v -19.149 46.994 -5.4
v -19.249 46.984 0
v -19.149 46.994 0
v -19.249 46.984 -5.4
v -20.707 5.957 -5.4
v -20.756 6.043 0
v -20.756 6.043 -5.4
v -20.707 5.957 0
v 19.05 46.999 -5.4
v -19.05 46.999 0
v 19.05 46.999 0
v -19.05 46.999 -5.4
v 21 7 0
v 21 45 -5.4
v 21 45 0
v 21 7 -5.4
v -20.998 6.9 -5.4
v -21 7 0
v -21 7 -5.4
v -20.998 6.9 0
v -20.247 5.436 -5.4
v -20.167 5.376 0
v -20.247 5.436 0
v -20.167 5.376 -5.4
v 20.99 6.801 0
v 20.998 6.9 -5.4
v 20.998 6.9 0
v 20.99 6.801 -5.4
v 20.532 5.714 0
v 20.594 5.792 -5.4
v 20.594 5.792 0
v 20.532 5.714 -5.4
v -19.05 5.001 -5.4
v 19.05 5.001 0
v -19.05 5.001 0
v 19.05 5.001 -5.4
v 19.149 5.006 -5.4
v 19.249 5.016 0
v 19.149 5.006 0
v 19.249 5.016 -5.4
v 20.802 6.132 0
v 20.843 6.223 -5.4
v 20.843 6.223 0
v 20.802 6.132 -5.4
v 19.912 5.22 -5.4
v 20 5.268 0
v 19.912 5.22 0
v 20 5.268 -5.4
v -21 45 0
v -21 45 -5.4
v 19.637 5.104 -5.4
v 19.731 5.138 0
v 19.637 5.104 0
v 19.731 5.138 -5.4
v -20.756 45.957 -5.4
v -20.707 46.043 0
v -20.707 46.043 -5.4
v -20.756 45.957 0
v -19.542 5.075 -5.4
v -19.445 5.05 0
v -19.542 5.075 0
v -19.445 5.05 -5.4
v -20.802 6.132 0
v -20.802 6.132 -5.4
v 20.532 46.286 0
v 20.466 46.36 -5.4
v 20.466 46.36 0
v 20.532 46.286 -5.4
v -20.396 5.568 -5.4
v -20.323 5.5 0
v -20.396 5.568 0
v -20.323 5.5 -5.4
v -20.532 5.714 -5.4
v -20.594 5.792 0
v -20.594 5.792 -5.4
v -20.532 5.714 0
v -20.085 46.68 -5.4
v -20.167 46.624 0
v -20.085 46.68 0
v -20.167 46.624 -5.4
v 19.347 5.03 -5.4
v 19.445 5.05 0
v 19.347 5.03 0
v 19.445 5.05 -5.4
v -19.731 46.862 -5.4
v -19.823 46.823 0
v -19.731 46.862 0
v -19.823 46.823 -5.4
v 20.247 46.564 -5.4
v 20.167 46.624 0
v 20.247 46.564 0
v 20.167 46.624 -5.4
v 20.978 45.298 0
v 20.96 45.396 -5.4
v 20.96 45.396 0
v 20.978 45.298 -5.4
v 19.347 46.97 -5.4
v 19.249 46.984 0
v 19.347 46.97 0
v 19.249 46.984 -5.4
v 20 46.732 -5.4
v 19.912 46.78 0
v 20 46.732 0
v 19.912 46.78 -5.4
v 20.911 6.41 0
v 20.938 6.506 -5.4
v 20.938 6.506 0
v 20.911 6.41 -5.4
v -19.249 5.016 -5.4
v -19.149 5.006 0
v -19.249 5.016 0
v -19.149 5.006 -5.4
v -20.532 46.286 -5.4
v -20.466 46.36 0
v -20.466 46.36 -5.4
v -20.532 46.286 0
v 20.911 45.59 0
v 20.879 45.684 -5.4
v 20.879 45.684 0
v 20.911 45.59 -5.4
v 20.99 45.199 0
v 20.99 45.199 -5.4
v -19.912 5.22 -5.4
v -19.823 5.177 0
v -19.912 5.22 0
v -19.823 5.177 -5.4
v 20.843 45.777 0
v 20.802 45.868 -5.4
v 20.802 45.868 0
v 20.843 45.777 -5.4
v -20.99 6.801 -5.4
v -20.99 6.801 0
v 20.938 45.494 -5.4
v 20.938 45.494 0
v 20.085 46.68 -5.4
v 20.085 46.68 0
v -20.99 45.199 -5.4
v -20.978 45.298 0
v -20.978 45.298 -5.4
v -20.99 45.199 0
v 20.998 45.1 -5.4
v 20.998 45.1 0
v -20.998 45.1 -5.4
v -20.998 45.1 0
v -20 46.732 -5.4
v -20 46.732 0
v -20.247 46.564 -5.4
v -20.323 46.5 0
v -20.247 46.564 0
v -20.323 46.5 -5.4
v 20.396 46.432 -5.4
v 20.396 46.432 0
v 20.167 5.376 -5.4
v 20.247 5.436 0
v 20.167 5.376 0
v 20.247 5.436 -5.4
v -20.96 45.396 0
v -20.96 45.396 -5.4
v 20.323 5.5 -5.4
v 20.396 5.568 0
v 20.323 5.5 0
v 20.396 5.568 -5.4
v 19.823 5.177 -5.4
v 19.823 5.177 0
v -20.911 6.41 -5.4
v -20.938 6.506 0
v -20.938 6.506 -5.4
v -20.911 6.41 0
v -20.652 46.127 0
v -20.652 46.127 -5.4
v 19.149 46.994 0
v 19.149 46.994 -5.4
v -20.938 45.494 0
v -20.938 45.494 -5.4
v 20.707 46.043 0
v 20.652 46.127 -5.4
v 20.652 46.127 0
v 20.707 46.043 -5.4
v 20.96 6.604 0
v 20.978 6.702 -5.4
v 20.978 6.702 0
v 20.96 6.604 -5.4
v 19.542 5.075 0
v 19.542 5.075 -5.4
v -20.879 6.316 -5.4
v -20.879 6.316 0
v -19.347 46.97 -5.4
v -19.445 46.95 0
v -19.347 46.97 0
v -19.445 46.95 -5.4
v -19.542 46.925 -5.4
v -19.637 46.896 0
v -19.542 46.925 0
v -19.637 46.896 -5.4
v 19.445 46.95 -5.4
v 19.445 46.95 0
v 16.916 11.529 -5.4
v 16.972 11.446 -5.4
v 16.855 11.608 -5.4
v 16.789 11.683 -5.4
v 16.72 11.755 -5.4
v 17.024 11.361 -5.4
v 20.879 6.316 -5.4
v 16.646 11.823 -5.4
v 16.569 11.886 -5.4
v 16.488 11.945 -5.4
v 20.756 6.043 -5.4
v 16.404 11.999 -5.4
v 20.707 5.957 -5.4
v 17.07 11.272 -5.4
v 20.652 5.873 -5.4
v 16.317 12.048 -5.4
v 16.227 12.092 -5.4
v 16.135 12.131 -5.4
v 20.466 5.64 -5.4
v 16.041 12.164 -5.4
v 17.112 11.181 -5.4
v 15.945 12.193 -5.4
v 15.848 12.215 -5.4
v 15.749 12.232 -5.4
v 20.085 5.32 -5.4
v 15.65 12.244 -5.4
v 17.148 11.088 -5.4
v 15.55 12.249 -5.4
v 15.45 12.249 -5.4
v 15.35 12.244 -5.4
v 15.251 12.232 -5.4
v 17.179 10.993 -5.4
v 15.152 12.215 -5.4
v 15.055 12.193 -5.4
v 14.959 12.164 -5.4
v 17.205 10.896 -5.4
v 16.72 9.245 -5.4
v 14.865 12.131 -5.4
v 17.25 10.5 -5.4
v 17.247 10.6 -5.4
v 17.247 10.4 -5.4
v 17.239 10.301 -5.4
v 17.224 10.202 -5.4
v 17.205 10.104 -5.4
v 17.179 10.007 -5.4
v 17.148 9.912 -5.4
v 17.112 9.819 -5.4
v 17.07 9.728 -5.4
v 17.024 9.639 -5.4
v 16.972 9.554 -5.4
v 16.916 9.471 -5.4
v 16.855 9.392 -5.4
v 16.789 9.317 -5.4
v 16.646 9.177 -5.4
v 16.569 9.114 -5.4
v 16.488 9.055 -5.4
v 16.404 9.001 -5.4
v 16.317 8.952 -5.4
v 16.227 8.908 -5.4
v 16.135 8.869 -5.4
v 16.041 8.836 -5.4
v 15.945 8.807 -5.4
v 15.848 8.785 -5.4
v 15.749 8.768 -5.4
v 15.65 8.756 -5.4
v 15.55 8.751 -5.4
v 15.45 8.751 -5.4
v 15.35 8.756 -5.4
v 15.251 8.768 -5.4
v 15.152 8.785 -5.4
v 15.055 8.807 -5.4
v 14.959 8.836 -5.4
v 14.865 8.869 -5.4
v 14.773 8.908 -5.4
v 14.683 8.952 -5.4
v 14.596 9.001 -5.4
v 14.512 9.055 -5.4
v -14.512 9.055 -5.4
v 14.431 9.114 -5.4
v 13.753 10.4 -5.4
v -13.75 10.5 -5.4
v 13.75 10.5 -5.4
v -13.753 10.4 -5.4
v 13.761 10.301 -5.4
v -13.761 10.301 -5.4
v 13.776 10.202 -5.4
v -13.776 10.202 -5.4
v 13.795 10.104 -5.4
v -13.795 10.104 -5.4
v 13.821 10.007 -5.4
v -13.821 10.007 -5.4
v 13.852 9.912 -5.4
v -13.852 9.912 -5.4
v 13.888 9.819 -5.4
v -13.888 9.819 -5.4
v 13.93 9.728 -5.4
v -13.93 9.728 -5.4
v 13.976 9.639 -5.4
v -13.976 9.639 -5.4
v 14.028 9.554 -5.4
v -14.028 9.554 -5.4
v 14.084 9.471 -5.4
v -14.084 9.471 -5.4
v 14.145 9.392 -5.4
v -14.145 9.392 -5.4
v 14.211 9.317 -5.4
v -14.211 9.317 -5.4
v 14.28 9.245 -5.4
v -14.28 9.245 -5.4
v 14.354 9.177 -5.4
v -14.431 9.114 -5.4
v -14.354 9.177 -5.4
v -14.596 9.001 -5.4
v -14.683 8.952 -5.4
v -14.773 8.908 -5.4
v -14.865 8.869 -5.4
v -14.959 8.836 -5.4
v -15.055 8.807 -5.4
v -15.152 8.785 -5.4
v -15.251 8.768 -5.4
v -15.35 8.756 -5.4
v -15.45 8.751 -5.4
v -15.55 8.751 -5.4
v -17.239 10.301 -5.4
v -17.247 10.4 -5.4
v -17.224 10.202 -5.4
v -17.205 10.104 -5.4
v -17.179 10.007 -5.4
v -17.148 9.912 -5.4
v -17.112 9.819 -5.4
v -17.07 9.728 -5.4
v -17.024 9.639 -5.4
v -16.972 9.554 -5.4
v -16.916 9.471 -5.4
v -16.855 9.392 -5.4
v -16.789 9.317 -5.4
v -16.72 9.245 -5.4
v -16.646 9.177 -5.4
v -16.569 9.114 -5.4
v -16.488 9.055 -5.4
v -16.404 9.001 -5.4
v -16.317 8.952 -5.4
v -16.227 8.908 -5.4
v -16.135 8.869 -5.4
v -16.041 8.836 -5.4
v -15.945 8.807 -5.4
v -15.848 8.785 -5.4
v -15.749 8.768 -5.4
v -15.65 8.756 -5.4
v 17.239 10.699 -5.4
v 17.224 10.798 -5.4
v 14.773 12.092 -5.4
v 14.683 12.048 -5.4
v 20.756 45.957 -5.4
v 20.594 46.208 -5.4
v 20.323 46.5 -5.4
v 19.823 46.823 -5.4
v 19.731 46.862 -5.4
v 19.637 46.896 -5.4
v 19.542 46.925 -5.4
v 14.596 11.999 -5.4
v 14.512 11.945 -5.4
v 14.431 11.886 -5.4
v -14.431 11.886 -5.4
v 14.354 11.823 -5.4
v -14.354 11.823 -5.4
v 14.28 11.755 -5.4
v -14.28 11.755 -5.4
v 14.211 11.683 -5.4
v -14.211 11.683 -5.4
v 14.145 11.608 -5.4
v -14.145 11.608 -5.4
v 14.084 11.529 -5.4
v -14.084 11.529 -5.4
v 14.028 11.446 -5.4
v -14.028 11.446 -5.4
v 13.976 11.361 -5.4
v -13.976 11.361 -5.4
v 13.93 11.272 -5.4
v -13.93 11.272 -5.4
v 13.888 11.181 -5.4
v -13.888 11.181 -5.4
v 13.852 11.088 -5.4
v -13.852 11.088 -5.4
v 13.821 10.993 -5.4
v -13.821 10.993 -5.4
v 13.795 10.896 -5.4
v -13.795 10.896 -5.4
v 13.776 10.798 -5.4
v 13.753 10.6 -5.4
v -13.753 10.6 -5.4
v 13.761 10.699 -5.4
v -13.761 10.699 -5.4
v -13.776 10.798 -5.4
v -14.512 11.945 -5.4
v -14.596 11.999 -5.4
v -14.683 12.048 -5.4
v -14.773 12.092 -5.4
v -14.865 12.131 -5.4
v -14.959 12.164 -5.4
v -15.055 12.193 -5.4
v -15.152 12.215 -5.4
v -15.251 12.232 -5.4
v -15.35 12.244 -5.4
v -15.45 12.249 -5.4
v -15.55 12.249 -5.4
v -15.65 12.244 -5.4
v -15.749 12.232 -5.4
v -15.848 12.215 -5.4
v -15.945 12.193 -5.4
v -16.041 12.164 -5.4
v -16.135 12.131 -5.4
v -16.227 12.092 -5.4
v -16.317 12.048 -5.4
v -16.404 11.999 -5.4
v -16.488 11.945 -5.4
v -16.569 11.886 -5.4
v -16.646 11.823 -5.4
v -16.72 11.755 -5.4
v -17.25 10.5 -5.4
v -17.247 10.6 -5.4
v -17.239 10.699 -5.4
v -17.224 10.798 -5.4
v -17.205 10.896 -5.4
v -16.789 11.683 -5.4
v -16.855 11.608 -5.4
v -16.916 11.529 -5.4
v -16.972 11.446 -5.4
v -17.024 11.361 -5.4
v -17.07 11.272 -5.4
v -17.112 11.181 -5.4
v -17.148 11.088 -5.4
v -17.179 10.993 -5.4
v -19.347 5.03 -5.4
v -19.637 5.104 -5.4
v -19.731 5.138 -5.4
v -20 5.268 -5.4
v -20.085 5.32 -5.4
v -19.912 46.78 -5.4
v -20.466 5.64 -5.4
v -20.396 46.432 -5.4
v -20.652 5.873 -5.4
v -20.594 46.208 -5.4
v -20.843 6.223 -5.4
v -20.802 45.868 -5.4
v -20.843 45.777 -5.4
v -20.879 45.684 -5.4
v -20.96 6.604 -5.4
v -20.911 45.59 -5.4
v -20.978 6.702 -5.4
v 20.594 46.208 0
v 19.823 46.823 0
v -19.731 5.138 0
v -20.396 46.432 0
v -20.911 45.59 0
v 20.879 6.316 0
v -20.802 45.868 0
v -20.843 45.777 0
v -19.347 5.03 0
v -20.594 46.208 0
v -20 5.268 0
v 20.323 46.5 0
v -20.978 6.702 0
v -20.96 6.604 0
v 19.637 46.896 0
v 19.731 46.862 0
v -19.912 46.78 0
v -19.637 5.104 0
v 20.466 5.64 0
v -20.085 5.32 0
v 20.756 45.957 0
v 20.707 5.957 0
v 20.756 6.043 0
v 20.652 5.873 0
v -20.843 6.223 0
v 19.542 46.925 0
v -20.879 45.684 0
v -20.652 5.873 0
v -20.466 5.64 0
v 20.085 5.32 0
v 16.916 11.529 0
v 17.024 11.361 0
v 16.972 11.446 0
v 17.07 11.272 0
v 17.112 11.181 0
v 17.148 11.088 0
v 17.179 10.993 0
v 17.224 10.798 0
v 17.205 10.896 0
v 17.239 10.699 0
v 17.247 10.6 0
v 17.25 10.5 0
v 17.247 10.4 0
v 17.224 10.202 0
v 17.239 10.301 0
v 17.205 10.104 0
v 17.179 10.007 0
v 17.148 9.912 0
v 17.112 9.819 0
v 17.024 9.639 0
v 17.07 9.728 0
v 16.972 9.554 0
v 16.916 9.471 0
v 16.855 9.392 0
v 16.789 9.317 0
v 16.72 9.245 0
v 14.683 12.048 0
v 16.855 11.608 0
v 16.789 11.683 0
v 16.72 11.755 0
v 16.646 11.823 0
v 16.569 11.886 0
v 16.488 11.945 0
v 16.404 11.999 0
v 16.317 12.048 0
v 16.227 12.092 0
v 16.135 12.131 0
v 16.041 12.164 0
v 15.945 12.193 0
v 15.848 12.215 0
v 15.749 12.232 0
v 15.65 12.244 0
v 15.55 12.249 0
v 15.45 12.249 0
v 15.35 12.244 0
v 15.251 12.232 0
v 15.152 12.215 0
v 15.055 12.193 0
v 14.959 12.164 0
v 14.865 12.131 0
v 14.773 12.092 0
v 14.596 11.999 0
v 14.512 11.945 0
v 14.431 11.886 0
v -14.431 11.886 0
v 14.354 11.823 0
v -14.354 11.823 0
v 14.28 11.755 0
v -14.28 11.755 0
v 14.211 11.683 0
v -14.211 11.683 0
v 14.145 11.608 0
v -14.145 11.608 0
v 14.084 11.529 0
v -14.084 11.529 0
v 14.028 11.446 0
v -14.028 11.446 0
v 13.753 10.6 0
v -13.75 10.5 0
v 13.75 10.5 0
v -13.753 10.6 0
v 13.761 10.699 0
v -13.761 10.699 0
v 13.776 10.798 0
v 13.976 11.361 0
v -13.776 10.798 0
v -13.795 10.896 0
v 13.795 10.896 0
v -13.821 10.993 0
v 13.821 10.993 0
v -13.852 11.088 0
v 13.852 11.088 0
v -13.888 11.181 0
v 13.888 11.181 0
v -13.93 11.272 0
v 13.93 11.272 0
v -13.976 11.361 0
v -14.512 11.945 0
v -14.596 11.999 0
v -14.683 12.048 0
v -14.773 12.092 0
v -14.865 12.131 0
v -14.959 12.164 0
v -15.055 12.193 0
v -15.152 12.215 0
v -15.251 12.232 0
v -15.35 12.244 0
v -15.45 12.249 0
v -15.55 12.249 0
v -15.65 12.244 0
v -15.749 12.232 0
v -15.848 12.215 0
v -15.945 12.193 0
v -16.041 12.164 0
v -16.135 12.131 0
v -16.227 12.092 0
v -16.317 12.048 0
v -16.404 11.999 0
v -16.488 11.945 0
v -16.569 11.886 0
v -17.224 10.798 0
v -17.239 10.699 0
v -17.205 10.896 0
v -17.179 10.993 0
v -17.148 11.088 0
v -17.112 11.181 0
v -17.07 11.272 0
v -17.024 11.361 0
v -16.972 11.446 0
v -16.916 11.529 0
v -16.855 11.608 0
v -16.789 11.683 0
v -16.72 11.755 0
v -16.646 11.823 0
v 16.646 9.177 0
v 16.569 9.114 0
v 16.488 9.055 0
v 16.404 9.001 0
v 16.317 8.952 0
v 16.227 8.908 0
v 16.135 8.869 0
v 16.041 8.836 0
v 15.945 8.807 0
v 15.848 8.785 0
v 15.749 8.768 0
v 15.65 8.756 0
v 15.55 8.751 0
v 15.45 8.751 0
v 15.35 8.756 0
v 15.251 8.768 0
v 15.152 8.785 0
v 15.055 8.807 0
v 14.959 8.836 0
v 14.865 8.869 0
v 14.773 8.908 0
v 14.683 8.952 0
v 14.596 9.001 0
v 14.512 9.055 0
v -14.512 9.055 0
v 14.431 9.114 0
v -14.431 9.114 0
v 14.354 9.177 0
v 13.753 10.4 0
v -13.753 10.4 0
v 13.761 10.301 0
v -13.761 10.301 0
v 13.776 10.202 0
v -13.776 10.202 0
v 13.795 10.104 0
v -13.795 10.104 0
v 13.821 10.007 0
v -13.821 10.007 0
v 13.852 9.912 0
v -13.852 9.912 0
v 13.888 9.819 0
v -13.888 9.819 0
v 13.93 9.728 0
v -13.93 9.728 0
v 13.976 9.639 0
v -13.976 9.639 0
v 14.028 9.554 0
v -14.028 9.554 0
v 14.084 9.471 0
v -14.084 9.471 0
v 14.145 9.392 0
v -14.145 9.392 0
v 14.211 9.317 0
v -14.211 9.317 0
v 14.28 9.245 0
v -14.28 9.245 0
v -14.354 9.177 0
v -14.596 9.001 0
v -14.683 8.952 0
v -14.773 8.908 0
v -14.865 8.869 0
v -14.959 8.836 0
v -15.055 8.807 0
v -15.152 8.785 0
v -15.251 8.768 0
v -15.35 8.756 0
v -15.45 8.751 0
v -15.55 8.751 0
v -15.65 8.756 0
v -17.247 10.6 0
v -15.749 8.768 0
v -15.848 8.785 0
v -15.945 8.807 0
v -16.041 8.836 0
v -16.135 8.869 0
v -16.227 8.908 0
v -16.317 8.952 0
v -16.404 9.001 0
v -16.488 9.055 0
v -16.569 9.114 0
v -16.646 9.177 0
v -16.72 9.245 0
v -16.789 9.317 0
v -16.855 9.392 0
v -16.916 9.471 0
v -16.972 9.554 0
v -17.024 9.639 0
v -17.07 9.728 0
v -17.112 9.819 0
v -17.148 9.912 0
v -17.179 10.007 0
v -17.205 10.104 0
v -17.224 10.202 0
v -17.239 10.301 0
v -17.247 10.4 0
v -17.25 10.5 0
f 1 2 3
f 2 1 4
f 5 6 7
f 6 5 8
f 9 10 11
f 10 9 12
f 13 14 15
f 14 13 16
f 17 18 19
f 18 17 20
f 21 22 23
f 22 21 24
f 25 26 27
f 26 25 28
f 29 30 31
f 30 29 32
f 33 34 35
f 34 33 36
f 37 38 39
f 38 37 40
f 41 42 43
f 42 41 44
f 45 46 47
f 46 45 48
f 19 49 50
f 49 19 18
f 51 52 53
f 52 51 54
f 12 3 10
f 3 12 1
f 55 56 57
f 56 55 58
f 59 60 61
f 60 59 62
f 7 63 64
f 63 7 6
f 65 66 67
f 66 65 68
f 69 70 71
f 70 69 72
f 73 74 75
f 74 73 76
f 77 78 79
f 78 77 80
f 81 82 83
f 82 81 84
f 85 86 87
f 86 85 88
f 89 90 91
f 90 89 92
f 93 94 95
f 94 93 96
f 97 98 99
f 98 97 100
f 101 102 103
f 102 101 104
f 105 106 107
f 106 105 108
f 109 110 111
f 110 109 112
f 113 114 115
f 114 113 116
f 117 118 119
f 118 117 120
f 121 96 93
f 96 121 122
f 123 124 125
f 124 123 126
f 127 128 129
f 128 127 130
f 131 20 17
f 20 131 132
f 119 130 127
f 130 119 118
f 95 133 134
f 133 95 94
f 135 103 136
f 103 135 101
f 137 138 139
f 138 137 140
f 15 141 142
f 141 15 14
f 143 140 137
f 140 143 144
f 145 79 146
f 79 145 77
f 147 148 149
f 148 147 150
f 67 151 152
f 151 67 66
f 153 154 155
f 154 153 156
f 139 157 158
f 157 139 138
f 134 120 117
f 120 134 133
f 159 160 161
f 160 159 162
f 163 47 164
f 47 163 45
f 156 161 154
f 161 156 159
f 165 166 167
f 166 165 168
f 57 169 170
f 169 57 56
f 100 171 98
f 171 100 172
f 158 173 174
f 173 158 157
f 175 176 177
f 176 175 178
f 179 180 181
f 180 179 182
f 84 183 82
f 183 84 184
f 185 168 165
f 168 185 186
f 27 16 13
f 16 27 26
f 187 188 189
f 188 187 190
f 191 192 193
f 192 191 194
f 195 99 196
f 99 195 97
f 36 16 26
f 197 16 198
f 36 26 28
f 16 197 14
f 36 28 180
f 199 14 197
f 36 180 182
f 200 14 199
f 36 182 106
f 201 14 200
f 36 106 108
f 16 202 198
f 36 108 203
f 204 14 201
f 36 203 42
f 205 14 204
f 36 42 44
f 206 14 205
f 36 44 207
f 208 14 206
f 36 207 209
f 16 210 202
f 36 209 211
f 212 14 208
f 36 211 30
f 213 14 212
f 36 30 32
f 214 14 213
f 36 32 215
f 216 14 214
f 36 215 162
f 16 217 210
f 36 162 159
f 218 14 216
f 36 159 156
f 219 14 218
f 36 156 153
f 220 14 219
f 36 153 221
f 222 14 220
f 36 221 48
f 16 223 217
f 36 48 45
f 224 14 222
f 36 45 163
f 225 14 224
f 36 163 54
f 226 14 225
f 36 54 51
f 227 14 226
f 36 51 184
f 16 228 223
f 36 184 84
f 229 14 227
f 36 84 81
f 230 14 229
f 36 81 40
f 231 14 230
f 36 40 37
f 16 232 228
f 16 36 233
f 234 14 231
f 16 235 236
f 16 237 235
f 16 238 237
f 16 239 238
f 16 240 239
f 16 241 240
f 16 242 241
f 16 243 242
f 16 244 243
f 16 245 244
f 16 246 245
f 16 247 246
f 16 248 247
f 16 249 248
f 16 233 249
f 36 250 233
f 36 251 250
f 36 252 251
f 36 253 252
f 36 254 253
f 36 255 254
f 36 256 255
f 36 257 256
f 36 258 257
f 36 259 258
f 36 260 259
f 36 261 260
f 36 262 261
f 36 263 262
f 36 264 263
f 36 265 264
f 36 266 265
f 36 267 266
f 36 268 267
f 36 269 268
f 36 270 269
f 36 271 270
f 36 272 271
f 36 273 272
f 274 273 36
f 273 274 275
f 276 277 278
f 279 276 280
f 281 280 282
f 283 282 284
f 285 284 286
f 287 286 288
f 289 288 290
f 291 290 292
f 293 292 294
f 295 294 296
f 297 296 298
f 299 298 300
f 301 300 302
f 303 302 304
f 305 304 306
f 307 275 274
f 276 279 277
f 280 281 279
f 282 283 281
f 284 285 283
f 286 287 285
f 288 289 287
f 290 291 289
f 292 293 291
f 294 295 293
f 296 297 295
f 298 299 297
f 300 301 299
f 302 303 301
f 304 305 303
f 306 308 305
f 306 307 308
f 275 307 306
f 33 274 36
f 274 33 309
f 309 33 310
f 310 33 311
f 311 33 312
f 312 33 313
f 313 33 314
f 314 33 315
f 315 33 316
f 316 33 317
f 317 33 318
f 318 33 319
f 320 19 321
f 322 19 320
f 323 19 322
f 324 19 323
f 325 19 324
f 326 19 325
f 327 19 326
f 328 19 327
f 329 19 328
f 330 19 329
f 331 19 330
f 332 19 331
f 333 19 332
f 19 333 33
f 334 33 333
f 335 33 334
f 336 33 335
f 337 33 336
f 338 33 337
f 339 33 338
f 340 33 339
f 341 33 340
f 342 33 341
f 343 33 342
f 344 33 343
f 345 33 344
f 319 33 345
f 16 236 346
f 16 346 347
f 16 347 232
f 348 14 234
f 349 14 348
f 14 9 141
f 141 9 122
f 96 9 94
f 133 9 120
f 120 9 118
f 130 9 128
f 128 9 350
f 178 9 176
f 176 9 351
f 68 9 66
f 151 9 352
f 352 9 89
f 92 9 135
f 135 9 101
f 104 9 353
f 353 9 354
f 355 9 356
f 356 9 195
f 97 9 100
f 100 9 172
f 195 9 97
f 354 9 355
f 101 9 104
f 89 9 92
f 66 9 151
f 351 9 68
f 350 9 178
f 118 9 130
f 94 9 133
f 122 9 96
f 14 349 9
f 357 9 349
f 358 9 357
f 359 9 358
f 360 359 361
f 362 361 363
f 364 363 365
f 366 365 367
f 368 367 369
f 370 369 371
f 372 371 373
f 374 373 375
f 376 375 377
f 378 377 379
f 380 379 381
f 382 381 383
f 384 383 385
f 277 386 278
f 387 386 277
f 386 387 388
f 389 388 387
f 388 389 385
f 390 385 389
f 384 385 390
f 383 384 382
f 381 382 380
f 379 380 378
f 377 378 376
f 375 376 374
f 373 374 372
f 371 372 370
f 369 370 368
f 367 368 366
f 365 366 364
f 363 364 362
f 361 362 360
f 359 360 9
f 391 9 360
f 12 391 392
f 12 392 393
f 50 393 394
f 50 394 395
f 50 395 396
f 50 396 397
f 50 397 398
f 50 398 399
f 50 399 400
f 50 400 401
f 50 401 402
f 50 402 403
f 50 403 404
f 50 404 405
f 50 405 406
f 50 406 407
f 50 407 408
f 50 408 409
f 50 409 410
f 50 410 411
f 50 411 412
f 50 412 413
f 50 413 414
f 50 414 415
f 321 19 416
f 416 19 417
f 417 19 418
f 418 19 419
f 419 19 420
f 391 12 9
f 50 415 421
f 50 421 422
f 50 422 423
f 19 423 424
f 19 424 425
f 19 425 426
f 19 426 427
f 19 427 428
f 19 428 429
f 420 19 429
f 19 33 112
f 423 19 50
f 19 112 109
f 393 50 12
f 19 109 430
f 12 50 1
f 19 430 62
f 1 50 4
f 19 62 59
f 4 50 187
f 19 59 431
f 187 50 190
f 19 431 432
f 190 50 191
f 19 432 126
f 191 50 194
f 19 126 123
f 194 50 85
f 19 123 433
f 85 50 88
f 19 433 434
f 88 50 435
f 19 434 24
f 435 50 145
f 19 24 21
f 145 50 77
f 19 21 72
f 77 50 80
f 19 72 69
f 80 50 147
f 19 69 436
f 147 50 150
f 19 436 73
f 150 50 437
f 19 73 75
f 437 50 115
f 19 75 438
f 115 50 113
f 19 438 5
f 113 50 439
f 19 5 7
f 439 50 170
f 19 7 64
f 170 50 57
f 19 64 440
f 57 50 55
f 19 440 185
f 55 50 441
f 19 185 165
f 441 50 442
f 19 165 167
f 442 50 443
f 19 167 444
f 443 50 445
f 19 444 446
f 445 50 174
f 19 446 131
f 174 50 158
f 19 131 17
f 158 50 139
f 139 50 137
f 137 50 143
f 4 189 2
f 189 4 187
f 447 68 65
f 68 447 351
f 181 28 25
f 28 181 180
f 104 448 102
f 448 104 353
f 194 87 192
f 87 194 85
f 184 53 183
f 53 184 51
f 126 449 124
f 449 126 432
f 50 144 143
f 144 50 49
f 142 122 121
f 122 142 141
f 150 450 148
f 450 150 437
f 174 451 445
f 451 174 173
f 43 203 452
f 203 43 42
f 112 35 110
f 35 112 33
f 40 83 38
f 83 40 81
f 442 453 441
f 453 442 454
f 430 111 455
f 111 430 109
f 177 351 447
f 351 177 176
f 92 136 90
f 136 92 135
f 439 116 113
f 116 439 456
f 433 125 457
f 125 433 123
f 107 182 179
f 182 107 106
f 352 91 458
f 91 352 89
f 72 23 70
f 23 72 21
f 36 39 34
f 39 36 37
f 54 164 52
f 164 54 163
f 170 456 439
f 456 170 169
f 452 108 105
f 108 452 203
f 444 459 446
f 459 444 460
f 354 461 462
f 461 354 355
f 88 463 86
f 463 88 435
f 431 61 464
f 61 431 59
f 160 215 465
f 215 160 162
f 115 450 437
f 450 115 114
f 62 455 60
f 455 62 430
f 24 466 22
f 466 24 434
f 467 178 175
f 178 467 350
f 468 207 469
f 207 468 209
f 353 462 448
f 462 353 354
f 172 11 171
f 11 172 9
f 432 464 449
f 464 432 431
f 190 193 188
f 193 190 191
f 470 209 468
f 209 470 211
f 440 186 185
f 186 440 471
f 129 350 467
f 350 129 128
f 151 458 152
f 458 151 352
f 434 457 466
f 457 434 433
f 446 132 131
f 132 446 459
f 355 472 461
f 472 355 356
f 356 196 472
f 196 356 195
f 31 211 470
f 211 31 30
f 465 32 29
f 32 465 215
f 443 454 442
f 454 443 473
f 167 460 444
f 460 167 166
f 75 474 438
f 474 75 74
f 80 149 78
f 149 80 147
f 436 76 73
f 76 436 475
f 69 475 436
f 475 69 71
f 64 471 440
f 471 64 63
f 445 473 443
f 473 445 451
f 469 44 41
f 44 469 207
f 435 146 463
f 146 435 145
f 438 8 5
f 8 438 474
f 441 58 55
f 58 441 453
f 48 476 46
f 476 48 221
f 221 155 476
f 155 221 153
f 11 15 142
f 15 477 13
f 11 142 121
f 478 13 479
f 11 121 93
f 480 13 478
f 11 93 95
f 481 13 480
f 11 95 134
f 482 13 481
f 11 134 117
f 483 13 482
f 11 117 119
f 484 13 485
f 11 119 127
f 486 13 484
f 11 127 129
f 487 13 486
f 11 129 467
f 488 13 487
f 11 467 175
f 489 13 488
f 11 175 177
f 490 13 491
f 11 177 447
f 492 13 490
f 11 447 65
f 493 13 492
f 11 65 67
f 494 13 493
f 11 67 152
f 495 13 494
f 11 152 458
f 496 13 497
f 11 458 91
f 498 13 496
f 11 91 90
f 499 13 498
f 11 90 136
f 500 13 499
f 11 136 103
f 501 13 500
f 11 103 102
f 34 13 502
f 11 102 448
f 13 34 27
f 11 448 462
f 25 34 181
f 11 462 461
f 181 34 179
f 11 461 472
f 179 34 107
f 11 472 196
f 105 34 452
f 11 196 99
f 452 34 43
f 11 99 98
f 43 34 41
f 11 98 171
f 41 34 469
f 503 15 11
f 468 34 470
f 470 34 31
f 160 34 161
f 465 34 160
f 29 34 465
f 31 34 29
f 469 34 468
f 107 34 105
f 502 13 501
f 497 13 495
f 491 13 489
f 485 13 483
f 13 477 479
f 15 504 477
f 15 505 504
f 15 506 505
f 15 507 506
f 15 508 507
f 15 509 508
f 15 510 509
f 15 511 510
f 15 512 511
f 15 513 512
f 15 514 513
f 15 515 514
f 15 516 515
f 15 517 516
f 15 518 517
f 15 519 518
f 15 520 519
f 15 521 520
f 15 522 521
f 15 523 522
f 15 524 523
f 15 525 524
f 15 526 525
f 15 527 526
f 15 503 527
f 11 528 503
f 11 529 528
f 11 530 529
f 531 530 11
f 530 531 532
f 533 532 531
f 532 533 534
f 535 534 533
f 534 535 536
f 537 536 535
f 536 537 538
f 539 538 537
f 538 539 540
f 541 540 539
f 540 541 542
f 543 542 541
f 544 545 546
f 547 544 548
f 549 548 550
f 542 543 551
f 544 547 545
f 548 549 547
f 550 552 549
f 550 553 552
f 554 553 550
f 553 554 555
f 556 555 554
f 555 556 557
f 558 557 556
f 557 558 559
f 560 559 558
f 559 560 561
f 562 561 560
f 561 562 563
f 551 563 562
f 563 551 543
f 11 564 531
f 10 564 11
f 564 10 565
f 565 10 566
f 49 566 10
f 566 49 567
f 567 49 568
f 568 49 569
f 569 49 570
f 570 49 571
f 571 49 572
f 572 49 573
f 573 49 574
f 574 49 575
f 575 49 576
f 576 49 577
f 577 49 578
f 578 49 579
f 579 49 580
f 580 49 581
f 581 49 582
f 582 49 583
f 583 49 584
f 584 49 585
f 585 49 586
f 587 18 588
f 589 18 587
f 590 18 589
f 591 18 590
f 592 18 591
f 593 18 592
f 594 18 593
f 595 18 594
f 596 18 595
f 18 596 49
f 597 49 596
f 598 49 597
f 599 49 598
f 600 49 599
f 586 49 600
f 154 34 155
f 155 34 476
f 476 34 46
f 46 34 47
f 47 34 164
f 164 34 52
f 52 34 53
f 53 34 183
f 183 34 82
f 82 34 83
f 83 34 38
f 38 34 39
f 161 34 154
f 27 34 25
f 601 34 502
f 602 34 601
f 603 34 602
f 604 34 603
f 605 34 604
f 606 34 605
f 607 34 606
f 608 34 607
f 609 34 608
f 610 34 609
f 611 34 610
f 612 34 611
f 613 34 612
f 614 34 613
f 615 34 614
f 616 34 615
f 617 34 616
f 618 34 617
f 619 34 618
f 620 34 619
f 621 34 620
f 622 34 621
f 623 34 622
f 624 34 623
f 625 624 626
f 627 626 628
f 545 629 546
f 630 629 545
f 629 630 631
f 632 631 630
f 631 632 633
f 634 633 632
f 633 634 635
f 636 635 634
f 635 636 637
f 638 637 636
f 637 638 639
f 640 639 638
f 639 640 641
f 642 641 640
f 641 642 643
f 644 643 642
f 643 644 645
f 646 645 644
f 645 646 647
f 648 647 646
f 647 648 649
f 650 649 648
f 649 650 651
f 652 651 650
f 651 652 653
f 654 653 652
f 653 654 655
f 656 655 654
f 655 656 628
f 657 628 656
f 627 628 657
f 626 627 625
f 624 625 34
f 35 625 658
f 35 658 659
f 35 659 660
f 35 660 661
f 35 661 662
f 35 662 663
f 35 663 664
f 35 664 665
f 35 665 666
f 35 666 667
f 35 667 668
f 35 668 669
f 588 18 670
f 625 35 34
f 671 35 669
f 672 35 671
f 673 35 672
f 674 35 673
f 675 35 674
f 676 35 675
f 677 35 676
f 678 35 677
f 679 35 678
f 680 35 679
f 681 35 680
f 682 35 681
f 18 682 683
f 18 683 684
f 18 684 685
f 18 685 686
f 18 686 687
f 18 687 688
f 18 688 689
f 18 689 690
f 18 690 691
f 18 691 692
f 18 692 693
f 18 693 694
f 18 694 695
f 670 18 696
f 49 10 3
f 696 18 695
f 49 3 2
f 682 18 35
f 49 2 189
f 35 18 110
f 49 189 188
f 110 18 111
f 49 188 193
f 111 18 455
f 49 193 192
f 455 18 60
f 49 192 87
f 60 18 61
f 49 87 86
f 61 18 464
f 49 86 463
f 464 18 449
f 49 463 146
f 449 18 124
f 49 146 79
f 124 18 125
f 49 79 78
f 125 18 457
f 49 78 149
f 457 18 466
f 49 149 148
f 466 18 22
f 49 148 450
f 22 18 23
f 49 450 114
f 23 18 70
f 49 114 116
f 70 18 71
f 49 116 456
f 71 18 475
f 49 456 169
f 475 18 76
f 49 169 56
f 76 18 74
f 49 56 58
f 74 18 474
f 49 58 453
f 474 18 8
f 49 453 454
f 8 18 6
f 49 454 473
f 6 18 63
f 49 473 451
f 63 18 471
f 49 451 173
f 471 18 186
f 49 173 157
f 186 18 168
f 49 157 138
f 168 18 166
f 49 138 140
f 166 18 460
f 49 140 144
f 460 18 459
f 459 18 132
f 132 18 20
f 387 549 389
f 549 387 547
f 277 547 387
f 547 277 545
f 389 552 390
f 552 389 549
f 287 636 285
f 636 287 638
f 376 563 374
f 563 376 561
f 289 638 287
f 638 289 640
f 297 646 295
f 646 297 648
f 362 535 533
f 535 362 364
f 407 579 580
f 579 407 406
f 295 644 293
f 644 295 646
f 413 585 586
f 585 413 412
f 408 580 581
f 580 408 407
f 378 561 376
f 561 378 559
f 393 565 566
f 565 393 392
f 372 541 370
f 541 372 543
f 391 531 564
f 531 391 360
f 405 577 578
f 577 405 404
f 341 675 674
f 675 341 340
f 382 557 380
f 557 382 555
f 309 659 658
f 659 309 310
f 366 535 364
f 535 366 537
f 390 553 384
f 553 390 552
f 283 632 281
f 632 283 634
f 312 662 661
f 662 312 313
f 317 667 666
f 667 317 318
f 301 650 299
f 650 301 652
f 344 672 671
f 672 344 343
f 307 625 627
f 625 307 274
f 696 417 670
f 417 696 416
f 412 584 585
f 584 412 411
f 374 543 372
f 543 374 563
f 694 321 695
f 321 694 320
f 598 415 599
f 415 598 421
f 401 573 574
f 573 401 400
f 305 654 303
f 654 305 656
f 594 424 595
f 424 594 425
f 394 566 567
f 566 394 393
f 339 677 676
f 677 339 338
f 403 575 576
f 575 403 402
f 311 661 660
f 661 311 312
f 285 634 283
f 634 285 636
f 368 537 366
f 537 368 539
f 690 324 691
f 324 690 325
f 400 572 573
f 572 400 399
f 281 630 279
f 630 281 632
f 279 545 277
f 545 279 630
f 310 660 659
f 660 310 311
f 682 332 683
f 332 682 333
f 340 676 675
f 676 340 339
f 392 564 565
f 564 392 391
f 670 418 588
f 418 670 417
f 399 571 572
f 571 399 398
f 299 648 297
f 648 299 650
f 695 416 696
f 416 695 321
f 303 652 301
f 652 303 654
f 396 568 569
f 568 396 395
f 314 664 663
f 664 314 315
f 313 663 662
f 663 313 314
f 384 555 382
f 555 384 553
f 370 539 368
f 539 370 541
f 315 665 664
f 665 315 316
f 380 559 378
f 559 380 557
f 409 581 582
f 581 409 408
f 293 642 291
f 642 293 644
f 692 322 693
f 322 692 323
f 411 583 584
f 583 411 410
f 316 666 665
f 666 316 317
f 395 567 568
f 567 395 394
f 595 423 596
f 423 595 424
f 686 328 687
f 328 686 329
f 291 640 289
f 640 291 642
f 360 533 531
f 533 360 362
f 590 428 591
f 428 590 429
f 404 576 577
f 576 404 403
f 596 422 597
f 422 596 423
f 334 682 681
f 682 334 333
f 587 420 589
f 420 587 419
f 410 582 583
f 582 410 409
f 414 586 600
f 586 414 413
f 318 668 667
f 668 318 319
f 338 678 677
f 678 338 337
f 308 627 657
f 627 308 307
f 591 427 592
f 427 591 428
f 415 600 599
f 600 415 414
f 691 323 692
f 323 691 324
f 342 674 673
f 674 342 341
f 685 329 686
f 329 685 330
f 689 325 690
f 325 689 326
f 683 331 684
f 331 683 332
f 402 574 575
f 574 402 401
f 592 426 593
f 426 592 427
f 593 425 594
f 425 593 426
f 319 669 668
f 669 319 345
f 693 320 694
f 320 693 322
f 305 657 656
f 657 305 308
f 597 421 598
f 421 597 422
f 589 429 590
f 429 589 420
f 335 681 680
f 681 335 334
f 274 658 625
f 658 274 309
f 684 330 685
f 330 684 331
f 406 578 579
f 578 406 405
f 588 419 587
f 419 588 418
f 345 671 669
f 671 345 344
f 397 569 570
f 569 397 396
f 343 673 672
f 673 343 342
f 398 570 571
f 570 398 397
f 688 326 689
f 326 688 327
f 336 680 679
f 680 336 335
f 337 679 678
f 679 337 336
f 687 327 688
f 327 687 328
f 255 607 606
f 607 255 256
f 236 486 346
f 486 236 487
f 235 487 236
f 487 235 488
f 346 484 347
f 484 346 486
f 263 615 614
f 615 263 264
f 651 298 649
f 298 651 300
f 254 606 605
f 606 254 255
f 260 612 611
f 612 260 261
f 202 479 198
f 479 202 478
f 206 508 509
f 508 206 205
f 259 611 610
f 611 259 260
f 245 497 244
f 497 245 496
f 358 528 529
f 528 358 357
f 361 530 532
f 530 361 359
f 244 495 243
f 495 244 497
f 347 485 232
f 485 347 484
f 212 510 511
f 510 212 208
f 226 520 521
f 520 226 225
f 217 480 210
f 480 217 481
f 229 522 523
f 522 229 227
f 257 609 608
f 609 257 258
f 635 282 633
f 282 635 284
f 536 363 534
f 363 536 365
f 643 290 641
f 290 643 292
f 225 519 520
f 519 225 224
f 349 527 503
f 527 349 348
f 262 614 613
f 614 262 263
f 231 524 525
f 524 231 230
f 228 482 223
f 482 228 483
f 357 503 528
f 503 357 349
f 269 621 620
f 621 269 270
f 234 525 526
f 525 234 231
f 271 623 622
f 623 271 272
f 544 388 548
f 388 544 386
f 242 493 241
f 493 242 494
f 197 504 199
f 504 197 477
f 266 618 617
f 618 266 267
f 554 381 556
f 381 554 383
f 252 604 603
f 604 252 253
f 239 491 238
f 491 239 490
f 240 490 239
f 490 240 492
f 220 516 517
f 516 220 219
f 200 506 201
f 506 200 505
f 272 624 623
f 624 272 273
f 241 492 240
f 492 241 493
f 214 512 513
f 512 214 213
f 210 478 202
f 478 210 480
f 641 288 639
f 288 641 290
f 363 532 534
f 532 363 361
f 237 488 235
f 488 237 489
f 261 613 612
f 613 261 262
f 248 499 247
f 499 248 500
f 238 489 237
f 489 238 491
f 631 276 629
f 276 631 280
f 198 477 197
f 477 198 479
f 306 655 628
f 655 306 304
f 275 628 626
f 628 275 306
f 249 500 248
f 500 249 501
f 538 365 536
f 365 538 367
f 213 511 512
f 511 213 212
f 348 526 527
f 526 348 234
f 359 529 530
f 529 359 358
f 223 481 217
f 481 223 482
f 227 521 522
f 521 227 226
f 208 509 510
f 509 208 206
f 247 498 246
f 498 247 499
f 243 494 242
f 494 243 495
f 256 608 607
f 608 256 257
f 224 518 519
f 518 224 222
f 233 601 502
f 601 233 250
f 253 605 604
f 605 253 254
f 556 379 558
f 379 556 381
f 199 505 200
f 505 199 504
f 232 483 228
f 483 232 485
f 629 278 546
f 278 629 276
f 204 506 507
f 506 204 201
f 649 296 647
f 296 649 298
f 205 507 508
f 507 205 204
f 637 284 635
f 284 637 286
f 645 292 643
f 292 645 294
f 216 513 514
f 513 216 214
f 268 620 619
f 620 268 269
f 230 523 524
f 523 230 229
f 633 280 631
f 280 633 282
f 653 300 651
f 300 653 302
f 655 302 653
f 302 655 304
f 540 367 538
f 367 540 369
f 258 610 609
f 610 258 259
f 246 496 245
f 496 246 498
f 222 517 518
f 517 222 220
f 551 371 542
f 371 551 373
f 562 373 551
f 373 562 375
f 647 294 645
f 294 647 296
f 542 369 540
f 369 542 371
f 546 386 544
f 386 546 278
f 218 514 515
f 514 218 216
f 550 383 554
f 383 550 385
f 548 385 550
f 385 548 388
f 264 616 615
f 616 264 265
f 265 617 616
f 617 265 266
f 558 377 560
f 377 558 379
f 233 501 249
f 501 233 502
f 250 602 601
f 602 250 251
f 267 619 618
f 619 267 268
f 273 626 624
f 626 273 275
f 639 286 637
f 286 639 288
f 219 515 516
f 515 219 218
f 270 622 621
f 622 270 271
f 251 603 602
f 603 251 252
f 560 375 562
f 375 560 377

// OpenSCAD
/* 
Minor modification to this otherwise good carriage mount so that I can mount a Nema motor directly
      to the carriage plate without an adapter

      -- OK, well. There is an adapter now, but it's just because I thought this was better than 
             cutting a bolt to the cirrect length
*/

/* Render quality variables */
$fa = 1;
$fs = 0.1;

distanceBetweenThroughHoles = 31;
yOffset = 10;

supportDepth = 5.4;
supportWidth = 42;
supportHeight = 42;
cornerDiameter = 4;

nemaHoleOffset = 5.5;

spacerPlate();
// xCarriage();

module xCarriage()
{
    difference()
    {
        {
            import( "thirdParty/X-Carriage-mod.stl" );
        }
        {
            translate( [-1 * (distanceBetweenThroughHoles/2), yOffset, -1] )
            {
                m3ThroughHole();

                translate( [0, 0, 5.7] )
                {
                    m3HeadCutout();
                }
            }
            translate( [(distanceBetweenThroughHoles/2), yOffset, -1] )
            {
                m3ThroughHole();
                translate( [0, 0, 5.7] )
                {
                    m3HeadCutout();
                }
            }
        }
    }
}



module spacerPlate()
{
    difference()
    {
        {
            translate( [-1 * (supportWidth/2), 5, -1 * supportDepth] )
            {
                hull()
                {
                    {
                        translate( [(cornerDiameter/2), (cornerDiameter/2), 0] )
                        {
                            cube( [supportWidth - cornerDiameter, supportHeight - cornerDiameter, supportDepth] );
                        }
                    }
                    {
                        union()
                        {
                            translate( [(cornerDiameter/2), (cornerDiameter/2), 0] )
                            {
                                cylinder( d = cornerDiameter, h = supportDepth);
                            }

                            translate( [(cornerDiameter/2), supportHeight - (cornerDiameter/2), 0] )
                            {
                                cylinder( d = cornerDiameter, h = supportDepth);
                            }

                            translate( [supportWidth - (cornerDiameter/2), (cornerDiameter/2), 0] )
                            {
                                cylinder( d = cornerDiameter, h = supportDepth);
                            }

                            translate( [supportWidth - (cornerDiameter/2), supportHeight - (cornerDiameter/2), 0] )
                            {
                                cylinder( d = cornerDiameter, h = supportDepth);
                            }
                        }
                    }
                }
            }
        }
        {
            translate( [-1 * (distanceBetweenThroughHoles/2), 5 + nemaHoleOffset, -10] )
            {
                m3ThroughHole();
            }
            translate( [(distanceBetweenThroughHoles/2), 5 + nemaHoleOffset, -10] )
            {
                m3ThroughHole();
            }
        }
    }
}

module m3ThroughHole()
{
    cylinder( d=3.5, h=20, center=false );
}

module m3HeadCutout()
{
    cylinder( h = 20, d = 6.5 );
}
